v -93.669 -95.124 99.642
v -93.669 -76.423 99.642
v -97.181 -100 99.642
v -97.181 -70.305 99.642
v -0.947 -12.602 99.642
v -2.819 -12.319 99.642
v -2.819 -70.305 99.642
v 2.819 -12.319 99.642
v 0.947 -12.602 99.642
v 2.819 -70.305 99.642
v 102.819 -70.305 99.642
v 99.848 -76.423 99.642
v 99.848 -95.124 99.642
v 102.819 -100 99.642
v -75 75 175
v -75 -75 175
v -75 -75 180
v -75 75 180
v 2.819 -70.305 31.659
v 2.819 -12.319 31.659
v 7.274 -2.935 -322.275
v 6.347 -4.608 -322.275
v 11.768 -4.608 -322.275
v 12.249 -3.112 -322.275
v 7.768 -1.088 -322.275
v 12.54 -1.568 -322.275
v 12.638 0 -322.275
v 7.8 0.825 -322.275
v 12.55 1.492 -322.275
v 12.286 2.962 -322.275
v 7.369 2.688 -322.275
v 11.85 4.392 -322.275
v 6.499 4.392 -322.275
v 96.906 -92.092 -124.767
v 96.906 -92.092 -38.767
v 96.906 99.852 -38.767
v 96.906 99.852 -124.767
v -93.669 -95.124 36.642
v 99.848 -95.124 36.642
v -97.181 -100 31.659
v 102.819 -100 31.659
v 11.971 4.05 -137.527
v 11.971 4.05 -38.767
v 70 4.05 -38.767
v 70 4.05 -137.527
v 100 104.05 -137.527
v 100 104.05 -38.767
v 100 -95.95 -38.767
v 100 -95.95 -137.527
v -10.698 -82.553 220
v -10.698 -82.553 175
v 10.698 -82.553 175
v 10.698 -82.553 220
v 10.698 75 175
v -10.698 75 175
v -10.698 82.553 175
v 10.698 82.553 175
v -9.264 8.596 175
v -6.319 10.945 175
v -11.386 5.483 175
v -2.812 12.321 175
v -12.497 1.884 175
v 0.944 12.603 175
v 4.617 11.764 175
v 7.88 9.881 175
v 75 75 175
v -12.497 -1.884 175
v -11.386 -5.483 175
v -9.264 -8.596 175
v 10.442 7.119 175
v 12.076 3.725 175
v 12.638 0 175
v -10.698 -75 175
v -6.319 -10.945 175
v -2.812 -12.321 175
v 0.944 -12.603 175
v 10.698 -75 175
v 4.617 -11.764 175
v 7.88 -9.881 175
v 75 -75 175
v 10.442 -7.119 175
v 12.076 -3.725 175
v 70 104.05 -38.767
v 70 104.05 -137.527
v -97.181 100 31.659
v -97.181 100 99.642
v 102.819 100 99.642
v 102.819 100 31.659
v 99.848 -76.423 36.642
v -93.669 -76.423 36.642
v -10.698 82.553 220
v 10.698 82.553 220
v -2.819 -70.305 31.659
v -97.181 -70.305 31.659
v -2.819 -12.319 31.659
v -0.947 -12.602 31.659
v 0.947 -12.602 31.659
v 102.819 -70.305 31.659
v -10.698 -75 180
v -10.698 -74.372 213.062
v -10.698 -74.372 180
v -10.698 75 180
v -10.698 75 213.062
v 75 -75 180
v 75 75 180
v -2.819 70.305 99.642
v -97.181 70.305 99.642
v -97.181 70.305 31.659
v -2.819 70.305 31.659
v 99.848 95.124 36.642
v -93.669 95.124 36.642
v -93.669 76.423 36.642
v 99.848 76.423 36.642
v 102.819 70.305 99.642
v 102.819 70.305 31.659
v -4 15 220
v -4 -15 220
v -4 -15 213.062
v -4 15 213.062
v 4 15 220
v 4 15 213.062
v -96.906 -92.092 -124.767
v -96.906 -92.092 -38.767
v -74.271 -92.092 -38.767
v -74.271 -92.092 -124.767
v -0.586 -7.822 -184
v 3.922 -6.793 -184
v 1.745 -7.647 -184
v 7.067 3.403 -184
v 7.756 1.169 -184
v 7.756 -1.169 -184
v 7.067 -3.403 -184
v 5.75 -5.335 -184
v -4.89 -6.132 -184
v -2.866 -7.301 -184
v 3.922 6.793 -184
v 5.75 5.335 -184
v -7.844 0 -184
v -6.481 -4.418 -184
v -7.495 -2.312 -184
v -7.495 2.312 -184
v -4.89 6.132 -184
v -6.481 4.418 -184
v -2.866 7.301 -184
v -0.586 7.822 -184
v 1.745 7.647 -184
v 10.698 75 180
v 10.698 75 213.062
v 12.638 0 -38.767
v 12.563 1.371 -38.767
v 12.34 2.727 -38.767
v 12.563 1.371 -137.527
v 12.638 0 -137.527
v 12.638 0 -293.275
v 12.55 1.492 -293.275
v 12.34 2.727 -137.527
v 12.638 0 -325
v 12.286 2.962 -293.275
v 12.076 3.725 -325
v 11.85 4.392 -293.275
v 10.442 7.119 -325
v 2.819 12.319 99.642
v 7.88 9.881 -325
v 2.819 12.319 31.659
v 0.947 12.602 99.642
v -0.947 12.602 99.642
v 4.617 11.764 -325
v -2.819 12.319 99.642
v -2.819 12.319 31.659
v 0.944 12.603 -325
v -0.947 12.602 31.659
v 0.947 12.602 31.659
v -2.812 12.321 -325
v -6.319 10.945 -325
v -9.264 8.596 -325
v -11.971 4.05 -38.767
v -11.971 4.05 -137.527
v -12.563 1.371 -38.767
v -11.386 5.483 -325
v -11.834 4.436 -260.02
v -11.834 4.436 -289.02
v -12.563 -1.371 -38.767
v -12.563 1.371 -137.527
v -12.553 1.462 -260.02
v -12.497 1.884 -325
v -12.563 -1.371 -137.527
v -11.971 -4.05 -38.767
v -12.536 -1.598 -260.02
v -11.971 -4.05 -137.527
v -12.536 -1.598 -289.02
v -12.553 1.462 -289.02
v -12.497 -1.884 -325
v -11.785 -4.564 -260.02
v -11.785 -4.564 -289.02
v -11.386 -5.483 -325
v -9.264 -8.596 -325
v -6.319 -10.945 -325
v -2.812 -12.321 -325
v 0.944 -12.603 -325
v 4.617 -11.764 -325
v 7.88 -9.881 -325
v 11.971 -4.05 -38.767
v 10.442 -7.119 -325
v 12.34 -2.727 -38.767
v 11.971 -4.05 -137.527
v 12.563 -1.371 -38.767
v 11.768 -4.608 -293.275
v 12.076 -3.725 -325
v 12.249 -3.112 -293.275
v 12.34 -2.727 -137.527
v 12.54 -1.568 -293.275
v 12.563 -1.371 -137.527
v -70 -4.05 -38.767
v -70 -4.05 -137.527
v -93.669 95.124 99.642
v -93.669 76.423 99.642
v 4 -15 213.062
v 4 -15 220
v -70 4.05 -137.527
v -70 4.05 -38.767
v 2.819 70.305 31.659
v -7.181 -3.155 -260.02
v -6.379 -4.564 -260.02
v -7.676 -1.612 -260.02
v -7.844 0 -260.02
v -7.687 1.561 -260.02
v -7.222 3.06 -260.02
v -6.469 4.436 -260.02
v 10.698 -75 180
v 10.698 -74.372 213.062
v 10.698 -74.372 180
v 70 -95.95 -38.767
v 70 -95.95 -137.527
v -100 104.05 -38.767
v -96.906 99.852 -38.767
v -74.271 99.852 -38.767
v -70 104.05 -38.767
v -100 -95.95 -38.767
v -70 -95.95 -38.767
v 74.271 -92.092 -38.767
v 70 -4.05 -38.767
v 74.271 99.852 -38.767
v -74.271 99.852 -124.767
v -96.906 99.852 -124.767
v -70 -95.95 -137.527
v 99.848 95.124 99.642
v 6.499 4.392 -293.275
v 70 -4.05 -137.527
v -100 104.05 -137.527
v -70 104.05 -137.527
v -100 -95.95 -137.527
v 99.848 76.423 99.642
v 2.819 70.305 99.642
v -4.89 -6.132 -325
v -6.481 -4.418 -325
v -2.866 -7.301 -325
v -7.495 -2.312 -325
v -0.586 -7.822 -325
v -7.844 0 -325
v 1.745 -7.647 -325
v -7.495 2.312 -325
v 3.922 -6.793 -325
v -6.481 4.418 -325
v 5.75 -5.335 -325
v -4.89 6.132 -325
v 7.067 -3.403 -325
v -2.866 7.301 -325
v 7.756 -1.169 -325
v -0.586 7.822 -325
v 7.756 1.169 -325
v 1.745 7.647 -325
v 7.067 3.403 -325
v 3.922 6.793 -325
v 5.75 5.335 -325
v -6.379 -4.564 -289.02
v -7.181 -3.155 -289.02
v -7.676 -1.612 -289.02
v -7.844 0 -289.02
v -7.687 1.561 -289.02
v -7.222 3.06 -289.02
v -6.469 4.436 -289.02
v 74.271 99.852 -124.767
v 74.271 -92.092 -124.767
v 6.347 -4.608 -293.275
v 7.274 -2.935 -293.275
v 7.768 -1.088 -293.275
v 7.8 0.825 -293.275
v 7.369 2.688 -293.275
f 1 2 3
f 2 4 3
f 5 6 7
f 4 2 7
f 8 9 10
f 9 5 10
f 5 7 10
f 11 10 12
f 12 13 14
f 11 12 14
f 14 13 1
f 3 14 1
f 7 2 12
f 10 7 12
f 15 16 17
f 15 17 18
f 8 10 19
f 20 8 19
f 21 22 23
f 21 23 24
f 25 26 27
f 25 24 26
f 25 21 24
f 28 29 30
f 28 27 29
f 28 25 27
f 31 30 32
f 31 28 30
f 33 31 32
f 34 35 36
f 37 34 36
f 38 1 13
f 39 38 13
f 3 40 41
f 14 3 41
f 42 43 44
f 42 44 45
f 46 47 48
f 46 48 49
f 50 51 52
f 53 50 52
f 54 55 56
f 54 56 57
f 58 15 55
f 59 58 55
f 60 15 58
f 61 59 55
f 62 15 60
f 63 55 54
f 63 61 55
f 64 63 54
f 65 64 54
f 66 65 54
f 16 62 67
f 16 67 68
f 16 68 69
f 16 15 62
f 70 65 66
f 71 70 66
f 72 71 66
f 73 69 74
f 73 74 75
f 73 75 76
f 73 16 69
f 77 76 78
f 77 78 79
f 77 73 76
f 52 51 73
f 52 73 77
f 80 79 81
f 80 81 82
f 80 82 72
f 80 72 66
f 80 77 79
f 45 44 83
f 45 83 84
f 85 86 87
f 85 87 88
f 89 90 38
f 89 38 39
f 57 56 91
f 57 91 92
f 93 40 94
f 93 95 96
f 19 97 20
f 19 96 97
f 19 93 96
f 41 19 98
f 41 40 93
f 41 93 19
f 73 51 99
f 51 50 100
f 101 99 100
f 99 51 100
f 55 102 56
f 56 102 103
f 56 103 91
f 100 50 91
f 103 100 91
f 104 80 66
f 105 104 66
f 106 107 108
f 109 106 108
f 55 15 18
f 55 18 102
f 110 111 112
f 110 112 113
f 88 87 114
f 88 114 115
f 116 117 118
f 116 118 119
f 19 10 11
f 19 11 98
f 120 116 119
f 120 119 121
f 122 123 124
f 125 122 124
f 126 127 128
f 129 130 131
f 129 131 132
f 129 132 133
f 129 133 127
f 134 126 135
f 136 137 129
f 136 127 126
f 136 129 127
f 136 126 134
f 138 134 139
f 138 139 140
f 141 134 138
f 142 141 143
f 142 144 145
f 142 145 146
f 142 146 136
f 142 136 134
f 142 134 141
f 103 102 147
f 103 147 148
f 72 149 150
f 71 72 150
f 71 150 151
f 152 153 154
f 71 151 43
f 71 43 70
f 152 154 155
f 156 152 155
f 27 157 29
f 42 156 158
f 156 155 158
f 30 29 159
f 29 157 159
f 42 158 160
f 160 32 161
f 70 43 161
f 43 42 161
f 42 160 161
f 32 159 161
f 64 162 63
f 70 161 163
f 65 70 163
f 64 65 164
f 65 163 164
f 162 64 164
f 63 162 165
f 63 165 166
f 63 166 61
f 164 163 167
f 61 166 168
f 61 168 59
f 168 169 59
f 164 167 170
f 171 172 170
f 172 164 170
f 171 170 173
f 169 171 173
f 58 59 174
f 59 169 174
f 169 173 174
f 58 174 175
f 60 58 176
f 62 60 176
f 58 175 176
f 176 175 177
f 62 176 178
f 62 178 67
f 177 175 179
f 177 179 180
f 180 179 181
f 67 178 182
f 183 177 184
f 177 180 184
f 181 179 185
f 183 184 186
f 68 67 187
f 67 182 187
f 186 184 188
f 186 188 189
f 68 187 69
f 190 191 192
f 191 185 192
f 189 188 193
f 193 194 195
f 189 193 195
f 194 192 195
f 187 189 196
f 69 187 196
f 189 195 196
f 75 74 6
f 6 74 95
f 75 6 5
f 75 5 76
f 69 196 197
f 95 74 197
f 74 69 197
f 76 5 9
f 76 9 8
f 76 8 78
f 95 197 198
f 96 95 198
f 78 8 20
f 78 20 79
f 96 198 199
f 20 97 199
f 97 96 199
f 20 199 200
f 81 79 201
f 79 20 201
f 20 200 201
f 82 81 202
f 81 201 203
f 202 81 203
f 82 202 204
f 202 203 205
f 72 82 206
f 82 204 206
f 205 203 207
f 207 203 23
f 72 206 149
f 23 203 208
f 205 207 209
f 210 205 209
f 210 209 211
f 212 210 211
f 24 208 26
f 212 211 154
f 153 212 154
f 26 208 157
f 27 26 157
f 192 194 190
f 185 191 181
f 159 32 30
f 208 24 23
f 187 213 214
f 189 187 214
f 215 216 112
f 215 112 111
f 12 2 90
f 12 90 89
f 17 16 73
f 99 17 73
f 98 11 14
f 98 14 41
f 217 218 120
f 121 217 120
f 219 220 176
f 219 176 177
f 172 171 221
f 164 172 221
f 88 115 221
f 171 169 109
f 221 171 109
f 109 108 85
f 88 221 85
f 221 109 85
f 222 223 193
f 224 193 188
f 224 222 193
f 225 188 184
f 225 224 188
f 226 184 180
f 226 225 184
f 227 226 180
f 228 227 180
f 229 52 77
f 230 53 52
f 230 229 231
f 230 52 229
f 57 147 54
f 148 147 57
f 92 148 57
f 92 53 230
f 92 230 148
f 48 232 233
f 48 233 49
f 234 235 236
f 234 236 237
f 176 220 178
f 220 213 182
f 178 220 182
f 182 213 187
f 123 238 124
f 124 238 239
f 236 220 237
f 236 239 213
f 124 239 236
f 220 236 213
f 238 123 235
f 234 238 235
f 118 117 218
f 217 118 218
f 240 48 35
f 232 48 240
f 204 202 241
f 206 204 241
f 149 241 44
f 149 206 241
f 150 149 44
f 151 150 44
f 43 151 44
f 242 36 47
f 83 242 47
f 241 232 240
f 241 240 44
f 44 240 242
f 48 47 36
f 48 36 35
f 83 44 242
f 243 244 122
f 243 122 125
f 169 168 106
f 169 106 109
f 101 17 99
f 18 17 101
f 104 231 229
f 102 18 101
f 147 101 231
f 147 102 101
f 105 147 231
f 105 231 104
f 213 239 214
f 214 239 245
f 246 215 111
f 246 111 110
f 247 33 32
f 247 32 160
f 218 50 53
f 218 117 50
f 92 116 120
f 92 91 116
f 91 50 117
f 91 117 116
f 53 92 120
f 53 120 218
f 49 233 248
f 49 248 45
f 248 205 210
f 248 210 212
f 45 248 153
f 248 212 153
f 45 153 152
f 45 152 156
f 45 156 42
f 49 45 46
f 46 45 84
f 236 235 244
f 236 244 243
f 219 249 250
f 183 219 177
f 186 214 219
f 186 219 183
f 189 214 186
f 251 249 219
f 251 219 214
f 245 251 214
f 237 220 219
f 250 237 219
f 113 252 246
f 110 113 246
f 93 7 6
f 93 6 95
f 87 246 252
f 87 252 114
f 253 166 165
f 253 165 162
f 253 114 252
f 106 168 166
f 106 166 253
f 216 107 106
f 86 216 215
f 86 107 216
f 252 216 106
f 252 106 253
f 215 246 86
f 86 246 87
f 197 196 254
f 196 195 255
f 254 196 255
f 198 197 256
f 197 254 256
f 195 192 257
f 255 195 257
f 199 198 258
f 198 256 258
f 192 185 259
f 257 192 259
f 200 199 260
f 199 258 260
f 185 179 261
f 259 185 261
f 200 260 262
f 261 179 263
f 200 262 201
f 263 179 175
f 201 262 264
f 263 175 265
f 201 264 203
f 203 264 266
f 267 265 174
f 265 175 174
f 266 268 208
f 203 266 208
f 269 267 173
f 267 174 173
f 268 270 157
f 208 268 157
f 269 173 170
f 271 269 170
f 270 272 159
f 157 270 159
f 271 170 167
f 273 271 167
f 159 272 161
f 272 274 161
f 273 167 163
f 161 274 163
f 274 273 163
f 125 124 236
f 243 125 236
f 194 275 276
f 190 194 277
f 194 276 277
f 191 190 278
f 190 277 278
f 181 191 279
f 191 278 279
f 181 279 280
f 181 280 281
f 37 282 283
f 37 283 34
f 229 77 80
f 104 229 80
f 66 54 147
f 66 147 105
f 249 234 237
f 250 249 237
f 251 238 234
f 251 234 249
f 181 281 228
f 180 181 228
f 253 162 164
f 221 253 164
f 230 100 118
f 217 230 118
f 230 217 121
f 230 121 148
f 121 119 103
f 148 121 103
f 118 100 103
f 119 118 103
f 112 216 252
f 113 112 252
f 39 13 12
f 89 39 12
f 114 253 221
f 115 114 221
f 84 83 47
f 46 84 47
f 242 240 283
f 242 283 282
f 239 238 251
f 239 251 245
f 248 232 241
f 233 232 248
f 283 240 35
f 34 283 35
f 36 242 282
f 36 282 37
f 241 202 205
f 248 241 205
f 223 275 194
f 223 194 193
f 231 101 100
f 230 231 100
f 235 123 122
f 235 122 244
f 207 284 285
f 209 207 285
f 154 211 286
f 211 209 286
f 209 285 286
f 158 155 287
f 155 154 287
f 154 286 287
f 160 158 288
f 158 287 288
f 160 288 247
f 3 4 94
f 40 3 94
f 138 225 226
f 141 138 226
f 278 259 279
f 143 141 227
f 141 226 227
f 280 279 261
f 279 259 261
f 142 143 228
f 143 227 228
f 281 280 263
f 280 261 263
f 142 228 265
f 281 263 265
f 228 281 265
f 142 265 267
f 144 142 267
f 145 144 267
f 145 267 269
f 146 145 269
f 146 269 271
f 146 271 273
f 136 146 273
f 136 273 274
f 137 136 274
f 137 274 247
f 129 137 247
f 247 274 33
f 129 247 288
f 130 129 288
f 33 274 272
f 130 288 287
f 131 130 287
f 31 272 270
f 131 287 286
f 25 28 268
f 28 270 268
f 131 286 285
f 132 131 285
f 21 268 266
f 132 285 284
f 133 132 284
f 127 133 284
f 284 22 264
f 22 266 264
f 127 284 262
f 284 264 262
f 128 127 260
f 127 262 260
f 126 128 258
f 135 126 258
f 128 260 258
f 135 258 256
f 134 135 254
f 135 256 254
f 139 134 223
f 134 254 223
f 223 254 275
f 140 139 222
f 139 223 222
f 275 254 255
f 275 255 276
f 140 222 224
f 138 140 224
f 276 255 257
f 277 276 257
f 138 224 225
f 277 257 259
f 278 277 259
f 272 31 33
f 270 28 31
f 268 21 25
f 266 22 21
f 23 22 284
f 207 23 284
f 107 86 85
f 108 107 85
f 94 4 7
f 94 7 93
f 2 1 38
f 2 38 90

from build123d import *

# Parameters (mm, degrees)
BOSS_EXTRUDE1_DEPTH      = 175
BOSS_EXTRUDE1_DEPTH_BACK = 325
SKETCH1_R                = 12.637842641
BOSS_EXTRUDE2_DEPTH      = 100
BOSS_EXTRUDE2_DEPTH_BACK = 100
SKETCH2_W                = 5.637667912
SKETCH2_H                = 67.983642473
BOSS_EXTRUDE3_DEPTH      = 100
BOSS_EXTRUDE3_DEPTH_BACK = 100
SKETCH3_W                = 67.983642473
SKETCH3_H                = 29.694964858
SKETCH4_W                = 193.517193279
SKETCH4_H                = 18.701241368
CUT_EXTRUDE1_DEPTH       = 63
BOSS_EXTRUDE4_DEPTH      = 100
BOSS_EXTRUDE4_DEPTH_BACK = 100
SKETCH5_W                = 98.759478103
SKETCH5_H                = 8.09947515
BOSS_EXTRUDE5_DEPTH      = 100
BOSS_EXTRUDE5_DEPTH_BACK = 100
SKETCH6_W                = 30
SKETCH6_H                = 98.759478103
SKETCH7_W                = 22.635129566
SKETCH7_H                = 191.944809052
CUT_EXTRUDE2_DEPTH       = 86
SKETCH8_W                = 150
SKETCH8_H                = 150
BOSS_EXTRUDE6_DEPTH      = 5
BOSS_EXTRUDE7_REACH      = 566.29
SKETCH10_W               = 21.396607864
SKETCH10_H               = 165.105210234
SKETCH11_W               = 33.062075252
SKETCH11_H               = 149.372216897
CUT_EXTRUDE3_DEPTH       = 40
SKETCH12_W               = 8
SKETCH12_H               = 30
CUT_EXTRUDE4_DEPTH       = 30
SKETCH13_R               = 7.843556452
CUT_EXTRUDE5_DEPTH       = 141
SKETCH14_W               = 29
SKETCH14_H               = 9
CUT_EXTRUDE6_DEPTH       = 141
SKETCH15_W               = 29
SKETCH15_H               = 9
CUT_EXTRUDE7_DEPTH       = 83


with BuildPart() as part:
    # Sketch1 → Boss-Extrude1 (new, two sides: drawn at the far end of the back side and taken through both)
    with BuildSketch(Plane.XY.offset(-BOSS_EXTRUDE1_DEPTH_BACK)):
        Circle(SKETCH1_R)
    extrude(amount=BOSS_EXTRUDE1_DEPTH + BOSS_EXTRUDE1_DEPTH_BACK)

    # Sketch2 → Boss-Extrude2 (add, two sides: drawn at the far end of the back side and taken through both)
    with BuildSketch(Plane(origin=(0, 0, 0), x_dir=(1, 0, 0), z_dir=(0, 1, 0)).offset(-BOSS_EXTRUDE2_DEPTH_BACK)):
        with Locations((0, -65.65046148)):
            Rectangle(SKETCH2_W, SKETCH2_H)
    extrude(amount=BOSS_EXTRUDE2_DEPTH + BOSS_EXTRUDE2_DEPTH_BACK)

    # Sketch3 → Boss-Extrude3 (add, two sides: drawn at the far end of the back side and taken through both)
    with BuildSketch(Plane(origin=(2.818833956, 0, 0), x_dir=(0, 0, -1), z_dir=(1, 0, 0)).offset(-BOSS_EXTRUDE3_DEPTH_BACK)):
        with Locations((-65.65046148, 85.152517571)):
            Rectangle(SKETCH3_W, SKETCH3_H)
        with Locations((-65.65046148, -85.152517571)):
            Rectangle(SKETCH3_W, SKETCH3_H)
    extrude(amount=BOSS_EXTRUDE3_DEPTH + BOSS_EXTRUDE3_DEPTH_BACK)

    # Sketch4 → Cut-Extrude1 (cut)
    with BuildSketch(Plane.XY.offset(99.642282717)):
        with Locations((3.08986644, 85.773498781)):
            Rectangle(SKETCH4_W, SKETCH4_H)
        with Locations((3.08986644, -85.773498781)):
            Rectangle(SKETCH4_W, SKETCH4_H)
    extrude(amount=-CUT_EXTRUDE1_DEPTH, mode=Mode.SUBTRACT)

    # Sketch5 → Boss-Extrude4 (add, two sides: drawn at the far end of the back side and taken through both)
    with BuildSketch(Plane(origin=(0, 0, 0), x_dir=(0, 0, -1), z_dir=(1, 0, 0)).offset(-BOSS_EXTRUDE4_DEPTH_BACK)):
        with Locations((88.14712325, 0)):
            Rectangle(SKETCH5_W, SKETCH5_H)
    extrude(amount=BOSS_EXTRUDE4_DEPTH + BOSS_EXTRUDE4_DEPTH_BACK)

    # Sketch6 → Boss-Extrude5 (add, two sides: drawn at the far end of the back side and taken through both)
    with BuildSketch(Plane(origin=(0, 4.049737575, 0), x_dir=(1, 0, 0), z_dir=(0, 1, 0)).offset(-BOSS_EXTRUDE5_DEPTH_BACK)):
        with Locations((-85, 88.14712325)):
            Rectangle(SKETCH6_W, SKETCH6_H)
        with Locations((85, 88.14712325)):
            Rectangle(SKETCH6_W, SKETCH6_H)
    extrude(amount=BOSS_EXTRUDE5_DEPTH + BOSS_EXTRUDE5_DEPTH_BACK)

    # Sketch7 → Cut-Extrude2 (cut)
    with BuildSketch(Plane.XY.offset(-38.767384198)):
        with Locations((-85.588690937, 3.879977002)):
            Rectangle(SKETCH7_W, SKETCH7_H)
        with Locations((85.588690937, 3.879977002)):
            Rectangle(SKETCH7_W, SKETCH7_H)
    extrude(amount=-CUT_EXTRUDE2_DEPTH, mode=Mode.SUBTRACT)

    # Sketch8 → Boss-Extrude6 (add)
    with BuildSketch(Plane.XY.offset(175)):
        Rectangle(SKETCH8_W, SKETCH8_H)
    extrude(amount=BOSS_EXTRUDE6_DEPTH)

    # Boss-Extrude7: up to this face of the body (flat: up to its plane)
    boss_extrude7_end = Plane(part.part.faces().sort_by_distance((0, -72.878679656, 175))[0])
    # Sketch10 → Boss-Extrude7 (add, up to the picked face)
    with BuildSketch(Plane.XY.offset(220), mode=Mode.PRIVATE) as boss_extrude7_sk1:
        Rectangle(SKETCH10_W, SKETCH10_H)
    boss_extrude7_tool1 = split(extrude(boss_extrude7_sk1.sketch, amount=-BOSS_EXTRUDE7_REACH, mode=Mode.PRIVATE), bisect_by=boss_extrude7_end, keep=Keep.BOTH, mode=Mode.PRIVATE)
    add(boss_extrude7_tool1.solids().sort_by(Axis((0, 0, 220), (0, 0, -1)))[0])

    # Sketch11 → Cut-Extrude3 (cut)
    with BuildSketch(Plane.ZY.offset(10.698303932)):
        with Locations((196.531037626, 0.313891551)):
            Rectangle(SKETCH11_W, SKETCH11_H)
    extrude(amount=-CUT_EXTRUDE3_DEPTH, mode=Mode.SUBTRACT)

    # Sketch12 → Cut-Extrude4 (cut)
    with BuildSketch(Plane.XY.offset(220)):
        Rectangle(SKETCH12_W, SKETCH12_H)
    extrude(amount=-CUT_EXTRUDE4_DEPTH, mode=Mode.SUBTRACT)

    # Sketch13 → Cut-Extrude5 (cut)
    with BuildSketch(Plane(origin=(0, 0, -325), x_dir=(-1, 0, 0), z_dir=(0, 0, -1))):
        Circle(SKETCH13_R)
    extrude(amount=-CUT_EXTRUDE5_DEPTH, mode=Mode.SUBTRACT)

    # Sketch14 → Cut-Extrude6 (cut)
    with BuildSketch(Plane.ZY):
        with Locations((-307.774546231, -0.108379214)):
            Rectangle(SKETCH14_W, SKETCH14_H)
    extrude(amount=-CUT_EXTRUDE6_DEPTH, mode=Mode.SUBTRACT)

    # Sketch15 → Cut-Extrude7 (cut)
    with BuildSketch(Plane.ZY):
        with Locations((-274.519862271, -0.063837762)):
            Rectangle(SKETCH15_W, SKETCH15_H)
    extrude(amount=CUT_EXTRUDE7_DEPTH, mode=Mode.SUBTRACT)


solid = part.part
